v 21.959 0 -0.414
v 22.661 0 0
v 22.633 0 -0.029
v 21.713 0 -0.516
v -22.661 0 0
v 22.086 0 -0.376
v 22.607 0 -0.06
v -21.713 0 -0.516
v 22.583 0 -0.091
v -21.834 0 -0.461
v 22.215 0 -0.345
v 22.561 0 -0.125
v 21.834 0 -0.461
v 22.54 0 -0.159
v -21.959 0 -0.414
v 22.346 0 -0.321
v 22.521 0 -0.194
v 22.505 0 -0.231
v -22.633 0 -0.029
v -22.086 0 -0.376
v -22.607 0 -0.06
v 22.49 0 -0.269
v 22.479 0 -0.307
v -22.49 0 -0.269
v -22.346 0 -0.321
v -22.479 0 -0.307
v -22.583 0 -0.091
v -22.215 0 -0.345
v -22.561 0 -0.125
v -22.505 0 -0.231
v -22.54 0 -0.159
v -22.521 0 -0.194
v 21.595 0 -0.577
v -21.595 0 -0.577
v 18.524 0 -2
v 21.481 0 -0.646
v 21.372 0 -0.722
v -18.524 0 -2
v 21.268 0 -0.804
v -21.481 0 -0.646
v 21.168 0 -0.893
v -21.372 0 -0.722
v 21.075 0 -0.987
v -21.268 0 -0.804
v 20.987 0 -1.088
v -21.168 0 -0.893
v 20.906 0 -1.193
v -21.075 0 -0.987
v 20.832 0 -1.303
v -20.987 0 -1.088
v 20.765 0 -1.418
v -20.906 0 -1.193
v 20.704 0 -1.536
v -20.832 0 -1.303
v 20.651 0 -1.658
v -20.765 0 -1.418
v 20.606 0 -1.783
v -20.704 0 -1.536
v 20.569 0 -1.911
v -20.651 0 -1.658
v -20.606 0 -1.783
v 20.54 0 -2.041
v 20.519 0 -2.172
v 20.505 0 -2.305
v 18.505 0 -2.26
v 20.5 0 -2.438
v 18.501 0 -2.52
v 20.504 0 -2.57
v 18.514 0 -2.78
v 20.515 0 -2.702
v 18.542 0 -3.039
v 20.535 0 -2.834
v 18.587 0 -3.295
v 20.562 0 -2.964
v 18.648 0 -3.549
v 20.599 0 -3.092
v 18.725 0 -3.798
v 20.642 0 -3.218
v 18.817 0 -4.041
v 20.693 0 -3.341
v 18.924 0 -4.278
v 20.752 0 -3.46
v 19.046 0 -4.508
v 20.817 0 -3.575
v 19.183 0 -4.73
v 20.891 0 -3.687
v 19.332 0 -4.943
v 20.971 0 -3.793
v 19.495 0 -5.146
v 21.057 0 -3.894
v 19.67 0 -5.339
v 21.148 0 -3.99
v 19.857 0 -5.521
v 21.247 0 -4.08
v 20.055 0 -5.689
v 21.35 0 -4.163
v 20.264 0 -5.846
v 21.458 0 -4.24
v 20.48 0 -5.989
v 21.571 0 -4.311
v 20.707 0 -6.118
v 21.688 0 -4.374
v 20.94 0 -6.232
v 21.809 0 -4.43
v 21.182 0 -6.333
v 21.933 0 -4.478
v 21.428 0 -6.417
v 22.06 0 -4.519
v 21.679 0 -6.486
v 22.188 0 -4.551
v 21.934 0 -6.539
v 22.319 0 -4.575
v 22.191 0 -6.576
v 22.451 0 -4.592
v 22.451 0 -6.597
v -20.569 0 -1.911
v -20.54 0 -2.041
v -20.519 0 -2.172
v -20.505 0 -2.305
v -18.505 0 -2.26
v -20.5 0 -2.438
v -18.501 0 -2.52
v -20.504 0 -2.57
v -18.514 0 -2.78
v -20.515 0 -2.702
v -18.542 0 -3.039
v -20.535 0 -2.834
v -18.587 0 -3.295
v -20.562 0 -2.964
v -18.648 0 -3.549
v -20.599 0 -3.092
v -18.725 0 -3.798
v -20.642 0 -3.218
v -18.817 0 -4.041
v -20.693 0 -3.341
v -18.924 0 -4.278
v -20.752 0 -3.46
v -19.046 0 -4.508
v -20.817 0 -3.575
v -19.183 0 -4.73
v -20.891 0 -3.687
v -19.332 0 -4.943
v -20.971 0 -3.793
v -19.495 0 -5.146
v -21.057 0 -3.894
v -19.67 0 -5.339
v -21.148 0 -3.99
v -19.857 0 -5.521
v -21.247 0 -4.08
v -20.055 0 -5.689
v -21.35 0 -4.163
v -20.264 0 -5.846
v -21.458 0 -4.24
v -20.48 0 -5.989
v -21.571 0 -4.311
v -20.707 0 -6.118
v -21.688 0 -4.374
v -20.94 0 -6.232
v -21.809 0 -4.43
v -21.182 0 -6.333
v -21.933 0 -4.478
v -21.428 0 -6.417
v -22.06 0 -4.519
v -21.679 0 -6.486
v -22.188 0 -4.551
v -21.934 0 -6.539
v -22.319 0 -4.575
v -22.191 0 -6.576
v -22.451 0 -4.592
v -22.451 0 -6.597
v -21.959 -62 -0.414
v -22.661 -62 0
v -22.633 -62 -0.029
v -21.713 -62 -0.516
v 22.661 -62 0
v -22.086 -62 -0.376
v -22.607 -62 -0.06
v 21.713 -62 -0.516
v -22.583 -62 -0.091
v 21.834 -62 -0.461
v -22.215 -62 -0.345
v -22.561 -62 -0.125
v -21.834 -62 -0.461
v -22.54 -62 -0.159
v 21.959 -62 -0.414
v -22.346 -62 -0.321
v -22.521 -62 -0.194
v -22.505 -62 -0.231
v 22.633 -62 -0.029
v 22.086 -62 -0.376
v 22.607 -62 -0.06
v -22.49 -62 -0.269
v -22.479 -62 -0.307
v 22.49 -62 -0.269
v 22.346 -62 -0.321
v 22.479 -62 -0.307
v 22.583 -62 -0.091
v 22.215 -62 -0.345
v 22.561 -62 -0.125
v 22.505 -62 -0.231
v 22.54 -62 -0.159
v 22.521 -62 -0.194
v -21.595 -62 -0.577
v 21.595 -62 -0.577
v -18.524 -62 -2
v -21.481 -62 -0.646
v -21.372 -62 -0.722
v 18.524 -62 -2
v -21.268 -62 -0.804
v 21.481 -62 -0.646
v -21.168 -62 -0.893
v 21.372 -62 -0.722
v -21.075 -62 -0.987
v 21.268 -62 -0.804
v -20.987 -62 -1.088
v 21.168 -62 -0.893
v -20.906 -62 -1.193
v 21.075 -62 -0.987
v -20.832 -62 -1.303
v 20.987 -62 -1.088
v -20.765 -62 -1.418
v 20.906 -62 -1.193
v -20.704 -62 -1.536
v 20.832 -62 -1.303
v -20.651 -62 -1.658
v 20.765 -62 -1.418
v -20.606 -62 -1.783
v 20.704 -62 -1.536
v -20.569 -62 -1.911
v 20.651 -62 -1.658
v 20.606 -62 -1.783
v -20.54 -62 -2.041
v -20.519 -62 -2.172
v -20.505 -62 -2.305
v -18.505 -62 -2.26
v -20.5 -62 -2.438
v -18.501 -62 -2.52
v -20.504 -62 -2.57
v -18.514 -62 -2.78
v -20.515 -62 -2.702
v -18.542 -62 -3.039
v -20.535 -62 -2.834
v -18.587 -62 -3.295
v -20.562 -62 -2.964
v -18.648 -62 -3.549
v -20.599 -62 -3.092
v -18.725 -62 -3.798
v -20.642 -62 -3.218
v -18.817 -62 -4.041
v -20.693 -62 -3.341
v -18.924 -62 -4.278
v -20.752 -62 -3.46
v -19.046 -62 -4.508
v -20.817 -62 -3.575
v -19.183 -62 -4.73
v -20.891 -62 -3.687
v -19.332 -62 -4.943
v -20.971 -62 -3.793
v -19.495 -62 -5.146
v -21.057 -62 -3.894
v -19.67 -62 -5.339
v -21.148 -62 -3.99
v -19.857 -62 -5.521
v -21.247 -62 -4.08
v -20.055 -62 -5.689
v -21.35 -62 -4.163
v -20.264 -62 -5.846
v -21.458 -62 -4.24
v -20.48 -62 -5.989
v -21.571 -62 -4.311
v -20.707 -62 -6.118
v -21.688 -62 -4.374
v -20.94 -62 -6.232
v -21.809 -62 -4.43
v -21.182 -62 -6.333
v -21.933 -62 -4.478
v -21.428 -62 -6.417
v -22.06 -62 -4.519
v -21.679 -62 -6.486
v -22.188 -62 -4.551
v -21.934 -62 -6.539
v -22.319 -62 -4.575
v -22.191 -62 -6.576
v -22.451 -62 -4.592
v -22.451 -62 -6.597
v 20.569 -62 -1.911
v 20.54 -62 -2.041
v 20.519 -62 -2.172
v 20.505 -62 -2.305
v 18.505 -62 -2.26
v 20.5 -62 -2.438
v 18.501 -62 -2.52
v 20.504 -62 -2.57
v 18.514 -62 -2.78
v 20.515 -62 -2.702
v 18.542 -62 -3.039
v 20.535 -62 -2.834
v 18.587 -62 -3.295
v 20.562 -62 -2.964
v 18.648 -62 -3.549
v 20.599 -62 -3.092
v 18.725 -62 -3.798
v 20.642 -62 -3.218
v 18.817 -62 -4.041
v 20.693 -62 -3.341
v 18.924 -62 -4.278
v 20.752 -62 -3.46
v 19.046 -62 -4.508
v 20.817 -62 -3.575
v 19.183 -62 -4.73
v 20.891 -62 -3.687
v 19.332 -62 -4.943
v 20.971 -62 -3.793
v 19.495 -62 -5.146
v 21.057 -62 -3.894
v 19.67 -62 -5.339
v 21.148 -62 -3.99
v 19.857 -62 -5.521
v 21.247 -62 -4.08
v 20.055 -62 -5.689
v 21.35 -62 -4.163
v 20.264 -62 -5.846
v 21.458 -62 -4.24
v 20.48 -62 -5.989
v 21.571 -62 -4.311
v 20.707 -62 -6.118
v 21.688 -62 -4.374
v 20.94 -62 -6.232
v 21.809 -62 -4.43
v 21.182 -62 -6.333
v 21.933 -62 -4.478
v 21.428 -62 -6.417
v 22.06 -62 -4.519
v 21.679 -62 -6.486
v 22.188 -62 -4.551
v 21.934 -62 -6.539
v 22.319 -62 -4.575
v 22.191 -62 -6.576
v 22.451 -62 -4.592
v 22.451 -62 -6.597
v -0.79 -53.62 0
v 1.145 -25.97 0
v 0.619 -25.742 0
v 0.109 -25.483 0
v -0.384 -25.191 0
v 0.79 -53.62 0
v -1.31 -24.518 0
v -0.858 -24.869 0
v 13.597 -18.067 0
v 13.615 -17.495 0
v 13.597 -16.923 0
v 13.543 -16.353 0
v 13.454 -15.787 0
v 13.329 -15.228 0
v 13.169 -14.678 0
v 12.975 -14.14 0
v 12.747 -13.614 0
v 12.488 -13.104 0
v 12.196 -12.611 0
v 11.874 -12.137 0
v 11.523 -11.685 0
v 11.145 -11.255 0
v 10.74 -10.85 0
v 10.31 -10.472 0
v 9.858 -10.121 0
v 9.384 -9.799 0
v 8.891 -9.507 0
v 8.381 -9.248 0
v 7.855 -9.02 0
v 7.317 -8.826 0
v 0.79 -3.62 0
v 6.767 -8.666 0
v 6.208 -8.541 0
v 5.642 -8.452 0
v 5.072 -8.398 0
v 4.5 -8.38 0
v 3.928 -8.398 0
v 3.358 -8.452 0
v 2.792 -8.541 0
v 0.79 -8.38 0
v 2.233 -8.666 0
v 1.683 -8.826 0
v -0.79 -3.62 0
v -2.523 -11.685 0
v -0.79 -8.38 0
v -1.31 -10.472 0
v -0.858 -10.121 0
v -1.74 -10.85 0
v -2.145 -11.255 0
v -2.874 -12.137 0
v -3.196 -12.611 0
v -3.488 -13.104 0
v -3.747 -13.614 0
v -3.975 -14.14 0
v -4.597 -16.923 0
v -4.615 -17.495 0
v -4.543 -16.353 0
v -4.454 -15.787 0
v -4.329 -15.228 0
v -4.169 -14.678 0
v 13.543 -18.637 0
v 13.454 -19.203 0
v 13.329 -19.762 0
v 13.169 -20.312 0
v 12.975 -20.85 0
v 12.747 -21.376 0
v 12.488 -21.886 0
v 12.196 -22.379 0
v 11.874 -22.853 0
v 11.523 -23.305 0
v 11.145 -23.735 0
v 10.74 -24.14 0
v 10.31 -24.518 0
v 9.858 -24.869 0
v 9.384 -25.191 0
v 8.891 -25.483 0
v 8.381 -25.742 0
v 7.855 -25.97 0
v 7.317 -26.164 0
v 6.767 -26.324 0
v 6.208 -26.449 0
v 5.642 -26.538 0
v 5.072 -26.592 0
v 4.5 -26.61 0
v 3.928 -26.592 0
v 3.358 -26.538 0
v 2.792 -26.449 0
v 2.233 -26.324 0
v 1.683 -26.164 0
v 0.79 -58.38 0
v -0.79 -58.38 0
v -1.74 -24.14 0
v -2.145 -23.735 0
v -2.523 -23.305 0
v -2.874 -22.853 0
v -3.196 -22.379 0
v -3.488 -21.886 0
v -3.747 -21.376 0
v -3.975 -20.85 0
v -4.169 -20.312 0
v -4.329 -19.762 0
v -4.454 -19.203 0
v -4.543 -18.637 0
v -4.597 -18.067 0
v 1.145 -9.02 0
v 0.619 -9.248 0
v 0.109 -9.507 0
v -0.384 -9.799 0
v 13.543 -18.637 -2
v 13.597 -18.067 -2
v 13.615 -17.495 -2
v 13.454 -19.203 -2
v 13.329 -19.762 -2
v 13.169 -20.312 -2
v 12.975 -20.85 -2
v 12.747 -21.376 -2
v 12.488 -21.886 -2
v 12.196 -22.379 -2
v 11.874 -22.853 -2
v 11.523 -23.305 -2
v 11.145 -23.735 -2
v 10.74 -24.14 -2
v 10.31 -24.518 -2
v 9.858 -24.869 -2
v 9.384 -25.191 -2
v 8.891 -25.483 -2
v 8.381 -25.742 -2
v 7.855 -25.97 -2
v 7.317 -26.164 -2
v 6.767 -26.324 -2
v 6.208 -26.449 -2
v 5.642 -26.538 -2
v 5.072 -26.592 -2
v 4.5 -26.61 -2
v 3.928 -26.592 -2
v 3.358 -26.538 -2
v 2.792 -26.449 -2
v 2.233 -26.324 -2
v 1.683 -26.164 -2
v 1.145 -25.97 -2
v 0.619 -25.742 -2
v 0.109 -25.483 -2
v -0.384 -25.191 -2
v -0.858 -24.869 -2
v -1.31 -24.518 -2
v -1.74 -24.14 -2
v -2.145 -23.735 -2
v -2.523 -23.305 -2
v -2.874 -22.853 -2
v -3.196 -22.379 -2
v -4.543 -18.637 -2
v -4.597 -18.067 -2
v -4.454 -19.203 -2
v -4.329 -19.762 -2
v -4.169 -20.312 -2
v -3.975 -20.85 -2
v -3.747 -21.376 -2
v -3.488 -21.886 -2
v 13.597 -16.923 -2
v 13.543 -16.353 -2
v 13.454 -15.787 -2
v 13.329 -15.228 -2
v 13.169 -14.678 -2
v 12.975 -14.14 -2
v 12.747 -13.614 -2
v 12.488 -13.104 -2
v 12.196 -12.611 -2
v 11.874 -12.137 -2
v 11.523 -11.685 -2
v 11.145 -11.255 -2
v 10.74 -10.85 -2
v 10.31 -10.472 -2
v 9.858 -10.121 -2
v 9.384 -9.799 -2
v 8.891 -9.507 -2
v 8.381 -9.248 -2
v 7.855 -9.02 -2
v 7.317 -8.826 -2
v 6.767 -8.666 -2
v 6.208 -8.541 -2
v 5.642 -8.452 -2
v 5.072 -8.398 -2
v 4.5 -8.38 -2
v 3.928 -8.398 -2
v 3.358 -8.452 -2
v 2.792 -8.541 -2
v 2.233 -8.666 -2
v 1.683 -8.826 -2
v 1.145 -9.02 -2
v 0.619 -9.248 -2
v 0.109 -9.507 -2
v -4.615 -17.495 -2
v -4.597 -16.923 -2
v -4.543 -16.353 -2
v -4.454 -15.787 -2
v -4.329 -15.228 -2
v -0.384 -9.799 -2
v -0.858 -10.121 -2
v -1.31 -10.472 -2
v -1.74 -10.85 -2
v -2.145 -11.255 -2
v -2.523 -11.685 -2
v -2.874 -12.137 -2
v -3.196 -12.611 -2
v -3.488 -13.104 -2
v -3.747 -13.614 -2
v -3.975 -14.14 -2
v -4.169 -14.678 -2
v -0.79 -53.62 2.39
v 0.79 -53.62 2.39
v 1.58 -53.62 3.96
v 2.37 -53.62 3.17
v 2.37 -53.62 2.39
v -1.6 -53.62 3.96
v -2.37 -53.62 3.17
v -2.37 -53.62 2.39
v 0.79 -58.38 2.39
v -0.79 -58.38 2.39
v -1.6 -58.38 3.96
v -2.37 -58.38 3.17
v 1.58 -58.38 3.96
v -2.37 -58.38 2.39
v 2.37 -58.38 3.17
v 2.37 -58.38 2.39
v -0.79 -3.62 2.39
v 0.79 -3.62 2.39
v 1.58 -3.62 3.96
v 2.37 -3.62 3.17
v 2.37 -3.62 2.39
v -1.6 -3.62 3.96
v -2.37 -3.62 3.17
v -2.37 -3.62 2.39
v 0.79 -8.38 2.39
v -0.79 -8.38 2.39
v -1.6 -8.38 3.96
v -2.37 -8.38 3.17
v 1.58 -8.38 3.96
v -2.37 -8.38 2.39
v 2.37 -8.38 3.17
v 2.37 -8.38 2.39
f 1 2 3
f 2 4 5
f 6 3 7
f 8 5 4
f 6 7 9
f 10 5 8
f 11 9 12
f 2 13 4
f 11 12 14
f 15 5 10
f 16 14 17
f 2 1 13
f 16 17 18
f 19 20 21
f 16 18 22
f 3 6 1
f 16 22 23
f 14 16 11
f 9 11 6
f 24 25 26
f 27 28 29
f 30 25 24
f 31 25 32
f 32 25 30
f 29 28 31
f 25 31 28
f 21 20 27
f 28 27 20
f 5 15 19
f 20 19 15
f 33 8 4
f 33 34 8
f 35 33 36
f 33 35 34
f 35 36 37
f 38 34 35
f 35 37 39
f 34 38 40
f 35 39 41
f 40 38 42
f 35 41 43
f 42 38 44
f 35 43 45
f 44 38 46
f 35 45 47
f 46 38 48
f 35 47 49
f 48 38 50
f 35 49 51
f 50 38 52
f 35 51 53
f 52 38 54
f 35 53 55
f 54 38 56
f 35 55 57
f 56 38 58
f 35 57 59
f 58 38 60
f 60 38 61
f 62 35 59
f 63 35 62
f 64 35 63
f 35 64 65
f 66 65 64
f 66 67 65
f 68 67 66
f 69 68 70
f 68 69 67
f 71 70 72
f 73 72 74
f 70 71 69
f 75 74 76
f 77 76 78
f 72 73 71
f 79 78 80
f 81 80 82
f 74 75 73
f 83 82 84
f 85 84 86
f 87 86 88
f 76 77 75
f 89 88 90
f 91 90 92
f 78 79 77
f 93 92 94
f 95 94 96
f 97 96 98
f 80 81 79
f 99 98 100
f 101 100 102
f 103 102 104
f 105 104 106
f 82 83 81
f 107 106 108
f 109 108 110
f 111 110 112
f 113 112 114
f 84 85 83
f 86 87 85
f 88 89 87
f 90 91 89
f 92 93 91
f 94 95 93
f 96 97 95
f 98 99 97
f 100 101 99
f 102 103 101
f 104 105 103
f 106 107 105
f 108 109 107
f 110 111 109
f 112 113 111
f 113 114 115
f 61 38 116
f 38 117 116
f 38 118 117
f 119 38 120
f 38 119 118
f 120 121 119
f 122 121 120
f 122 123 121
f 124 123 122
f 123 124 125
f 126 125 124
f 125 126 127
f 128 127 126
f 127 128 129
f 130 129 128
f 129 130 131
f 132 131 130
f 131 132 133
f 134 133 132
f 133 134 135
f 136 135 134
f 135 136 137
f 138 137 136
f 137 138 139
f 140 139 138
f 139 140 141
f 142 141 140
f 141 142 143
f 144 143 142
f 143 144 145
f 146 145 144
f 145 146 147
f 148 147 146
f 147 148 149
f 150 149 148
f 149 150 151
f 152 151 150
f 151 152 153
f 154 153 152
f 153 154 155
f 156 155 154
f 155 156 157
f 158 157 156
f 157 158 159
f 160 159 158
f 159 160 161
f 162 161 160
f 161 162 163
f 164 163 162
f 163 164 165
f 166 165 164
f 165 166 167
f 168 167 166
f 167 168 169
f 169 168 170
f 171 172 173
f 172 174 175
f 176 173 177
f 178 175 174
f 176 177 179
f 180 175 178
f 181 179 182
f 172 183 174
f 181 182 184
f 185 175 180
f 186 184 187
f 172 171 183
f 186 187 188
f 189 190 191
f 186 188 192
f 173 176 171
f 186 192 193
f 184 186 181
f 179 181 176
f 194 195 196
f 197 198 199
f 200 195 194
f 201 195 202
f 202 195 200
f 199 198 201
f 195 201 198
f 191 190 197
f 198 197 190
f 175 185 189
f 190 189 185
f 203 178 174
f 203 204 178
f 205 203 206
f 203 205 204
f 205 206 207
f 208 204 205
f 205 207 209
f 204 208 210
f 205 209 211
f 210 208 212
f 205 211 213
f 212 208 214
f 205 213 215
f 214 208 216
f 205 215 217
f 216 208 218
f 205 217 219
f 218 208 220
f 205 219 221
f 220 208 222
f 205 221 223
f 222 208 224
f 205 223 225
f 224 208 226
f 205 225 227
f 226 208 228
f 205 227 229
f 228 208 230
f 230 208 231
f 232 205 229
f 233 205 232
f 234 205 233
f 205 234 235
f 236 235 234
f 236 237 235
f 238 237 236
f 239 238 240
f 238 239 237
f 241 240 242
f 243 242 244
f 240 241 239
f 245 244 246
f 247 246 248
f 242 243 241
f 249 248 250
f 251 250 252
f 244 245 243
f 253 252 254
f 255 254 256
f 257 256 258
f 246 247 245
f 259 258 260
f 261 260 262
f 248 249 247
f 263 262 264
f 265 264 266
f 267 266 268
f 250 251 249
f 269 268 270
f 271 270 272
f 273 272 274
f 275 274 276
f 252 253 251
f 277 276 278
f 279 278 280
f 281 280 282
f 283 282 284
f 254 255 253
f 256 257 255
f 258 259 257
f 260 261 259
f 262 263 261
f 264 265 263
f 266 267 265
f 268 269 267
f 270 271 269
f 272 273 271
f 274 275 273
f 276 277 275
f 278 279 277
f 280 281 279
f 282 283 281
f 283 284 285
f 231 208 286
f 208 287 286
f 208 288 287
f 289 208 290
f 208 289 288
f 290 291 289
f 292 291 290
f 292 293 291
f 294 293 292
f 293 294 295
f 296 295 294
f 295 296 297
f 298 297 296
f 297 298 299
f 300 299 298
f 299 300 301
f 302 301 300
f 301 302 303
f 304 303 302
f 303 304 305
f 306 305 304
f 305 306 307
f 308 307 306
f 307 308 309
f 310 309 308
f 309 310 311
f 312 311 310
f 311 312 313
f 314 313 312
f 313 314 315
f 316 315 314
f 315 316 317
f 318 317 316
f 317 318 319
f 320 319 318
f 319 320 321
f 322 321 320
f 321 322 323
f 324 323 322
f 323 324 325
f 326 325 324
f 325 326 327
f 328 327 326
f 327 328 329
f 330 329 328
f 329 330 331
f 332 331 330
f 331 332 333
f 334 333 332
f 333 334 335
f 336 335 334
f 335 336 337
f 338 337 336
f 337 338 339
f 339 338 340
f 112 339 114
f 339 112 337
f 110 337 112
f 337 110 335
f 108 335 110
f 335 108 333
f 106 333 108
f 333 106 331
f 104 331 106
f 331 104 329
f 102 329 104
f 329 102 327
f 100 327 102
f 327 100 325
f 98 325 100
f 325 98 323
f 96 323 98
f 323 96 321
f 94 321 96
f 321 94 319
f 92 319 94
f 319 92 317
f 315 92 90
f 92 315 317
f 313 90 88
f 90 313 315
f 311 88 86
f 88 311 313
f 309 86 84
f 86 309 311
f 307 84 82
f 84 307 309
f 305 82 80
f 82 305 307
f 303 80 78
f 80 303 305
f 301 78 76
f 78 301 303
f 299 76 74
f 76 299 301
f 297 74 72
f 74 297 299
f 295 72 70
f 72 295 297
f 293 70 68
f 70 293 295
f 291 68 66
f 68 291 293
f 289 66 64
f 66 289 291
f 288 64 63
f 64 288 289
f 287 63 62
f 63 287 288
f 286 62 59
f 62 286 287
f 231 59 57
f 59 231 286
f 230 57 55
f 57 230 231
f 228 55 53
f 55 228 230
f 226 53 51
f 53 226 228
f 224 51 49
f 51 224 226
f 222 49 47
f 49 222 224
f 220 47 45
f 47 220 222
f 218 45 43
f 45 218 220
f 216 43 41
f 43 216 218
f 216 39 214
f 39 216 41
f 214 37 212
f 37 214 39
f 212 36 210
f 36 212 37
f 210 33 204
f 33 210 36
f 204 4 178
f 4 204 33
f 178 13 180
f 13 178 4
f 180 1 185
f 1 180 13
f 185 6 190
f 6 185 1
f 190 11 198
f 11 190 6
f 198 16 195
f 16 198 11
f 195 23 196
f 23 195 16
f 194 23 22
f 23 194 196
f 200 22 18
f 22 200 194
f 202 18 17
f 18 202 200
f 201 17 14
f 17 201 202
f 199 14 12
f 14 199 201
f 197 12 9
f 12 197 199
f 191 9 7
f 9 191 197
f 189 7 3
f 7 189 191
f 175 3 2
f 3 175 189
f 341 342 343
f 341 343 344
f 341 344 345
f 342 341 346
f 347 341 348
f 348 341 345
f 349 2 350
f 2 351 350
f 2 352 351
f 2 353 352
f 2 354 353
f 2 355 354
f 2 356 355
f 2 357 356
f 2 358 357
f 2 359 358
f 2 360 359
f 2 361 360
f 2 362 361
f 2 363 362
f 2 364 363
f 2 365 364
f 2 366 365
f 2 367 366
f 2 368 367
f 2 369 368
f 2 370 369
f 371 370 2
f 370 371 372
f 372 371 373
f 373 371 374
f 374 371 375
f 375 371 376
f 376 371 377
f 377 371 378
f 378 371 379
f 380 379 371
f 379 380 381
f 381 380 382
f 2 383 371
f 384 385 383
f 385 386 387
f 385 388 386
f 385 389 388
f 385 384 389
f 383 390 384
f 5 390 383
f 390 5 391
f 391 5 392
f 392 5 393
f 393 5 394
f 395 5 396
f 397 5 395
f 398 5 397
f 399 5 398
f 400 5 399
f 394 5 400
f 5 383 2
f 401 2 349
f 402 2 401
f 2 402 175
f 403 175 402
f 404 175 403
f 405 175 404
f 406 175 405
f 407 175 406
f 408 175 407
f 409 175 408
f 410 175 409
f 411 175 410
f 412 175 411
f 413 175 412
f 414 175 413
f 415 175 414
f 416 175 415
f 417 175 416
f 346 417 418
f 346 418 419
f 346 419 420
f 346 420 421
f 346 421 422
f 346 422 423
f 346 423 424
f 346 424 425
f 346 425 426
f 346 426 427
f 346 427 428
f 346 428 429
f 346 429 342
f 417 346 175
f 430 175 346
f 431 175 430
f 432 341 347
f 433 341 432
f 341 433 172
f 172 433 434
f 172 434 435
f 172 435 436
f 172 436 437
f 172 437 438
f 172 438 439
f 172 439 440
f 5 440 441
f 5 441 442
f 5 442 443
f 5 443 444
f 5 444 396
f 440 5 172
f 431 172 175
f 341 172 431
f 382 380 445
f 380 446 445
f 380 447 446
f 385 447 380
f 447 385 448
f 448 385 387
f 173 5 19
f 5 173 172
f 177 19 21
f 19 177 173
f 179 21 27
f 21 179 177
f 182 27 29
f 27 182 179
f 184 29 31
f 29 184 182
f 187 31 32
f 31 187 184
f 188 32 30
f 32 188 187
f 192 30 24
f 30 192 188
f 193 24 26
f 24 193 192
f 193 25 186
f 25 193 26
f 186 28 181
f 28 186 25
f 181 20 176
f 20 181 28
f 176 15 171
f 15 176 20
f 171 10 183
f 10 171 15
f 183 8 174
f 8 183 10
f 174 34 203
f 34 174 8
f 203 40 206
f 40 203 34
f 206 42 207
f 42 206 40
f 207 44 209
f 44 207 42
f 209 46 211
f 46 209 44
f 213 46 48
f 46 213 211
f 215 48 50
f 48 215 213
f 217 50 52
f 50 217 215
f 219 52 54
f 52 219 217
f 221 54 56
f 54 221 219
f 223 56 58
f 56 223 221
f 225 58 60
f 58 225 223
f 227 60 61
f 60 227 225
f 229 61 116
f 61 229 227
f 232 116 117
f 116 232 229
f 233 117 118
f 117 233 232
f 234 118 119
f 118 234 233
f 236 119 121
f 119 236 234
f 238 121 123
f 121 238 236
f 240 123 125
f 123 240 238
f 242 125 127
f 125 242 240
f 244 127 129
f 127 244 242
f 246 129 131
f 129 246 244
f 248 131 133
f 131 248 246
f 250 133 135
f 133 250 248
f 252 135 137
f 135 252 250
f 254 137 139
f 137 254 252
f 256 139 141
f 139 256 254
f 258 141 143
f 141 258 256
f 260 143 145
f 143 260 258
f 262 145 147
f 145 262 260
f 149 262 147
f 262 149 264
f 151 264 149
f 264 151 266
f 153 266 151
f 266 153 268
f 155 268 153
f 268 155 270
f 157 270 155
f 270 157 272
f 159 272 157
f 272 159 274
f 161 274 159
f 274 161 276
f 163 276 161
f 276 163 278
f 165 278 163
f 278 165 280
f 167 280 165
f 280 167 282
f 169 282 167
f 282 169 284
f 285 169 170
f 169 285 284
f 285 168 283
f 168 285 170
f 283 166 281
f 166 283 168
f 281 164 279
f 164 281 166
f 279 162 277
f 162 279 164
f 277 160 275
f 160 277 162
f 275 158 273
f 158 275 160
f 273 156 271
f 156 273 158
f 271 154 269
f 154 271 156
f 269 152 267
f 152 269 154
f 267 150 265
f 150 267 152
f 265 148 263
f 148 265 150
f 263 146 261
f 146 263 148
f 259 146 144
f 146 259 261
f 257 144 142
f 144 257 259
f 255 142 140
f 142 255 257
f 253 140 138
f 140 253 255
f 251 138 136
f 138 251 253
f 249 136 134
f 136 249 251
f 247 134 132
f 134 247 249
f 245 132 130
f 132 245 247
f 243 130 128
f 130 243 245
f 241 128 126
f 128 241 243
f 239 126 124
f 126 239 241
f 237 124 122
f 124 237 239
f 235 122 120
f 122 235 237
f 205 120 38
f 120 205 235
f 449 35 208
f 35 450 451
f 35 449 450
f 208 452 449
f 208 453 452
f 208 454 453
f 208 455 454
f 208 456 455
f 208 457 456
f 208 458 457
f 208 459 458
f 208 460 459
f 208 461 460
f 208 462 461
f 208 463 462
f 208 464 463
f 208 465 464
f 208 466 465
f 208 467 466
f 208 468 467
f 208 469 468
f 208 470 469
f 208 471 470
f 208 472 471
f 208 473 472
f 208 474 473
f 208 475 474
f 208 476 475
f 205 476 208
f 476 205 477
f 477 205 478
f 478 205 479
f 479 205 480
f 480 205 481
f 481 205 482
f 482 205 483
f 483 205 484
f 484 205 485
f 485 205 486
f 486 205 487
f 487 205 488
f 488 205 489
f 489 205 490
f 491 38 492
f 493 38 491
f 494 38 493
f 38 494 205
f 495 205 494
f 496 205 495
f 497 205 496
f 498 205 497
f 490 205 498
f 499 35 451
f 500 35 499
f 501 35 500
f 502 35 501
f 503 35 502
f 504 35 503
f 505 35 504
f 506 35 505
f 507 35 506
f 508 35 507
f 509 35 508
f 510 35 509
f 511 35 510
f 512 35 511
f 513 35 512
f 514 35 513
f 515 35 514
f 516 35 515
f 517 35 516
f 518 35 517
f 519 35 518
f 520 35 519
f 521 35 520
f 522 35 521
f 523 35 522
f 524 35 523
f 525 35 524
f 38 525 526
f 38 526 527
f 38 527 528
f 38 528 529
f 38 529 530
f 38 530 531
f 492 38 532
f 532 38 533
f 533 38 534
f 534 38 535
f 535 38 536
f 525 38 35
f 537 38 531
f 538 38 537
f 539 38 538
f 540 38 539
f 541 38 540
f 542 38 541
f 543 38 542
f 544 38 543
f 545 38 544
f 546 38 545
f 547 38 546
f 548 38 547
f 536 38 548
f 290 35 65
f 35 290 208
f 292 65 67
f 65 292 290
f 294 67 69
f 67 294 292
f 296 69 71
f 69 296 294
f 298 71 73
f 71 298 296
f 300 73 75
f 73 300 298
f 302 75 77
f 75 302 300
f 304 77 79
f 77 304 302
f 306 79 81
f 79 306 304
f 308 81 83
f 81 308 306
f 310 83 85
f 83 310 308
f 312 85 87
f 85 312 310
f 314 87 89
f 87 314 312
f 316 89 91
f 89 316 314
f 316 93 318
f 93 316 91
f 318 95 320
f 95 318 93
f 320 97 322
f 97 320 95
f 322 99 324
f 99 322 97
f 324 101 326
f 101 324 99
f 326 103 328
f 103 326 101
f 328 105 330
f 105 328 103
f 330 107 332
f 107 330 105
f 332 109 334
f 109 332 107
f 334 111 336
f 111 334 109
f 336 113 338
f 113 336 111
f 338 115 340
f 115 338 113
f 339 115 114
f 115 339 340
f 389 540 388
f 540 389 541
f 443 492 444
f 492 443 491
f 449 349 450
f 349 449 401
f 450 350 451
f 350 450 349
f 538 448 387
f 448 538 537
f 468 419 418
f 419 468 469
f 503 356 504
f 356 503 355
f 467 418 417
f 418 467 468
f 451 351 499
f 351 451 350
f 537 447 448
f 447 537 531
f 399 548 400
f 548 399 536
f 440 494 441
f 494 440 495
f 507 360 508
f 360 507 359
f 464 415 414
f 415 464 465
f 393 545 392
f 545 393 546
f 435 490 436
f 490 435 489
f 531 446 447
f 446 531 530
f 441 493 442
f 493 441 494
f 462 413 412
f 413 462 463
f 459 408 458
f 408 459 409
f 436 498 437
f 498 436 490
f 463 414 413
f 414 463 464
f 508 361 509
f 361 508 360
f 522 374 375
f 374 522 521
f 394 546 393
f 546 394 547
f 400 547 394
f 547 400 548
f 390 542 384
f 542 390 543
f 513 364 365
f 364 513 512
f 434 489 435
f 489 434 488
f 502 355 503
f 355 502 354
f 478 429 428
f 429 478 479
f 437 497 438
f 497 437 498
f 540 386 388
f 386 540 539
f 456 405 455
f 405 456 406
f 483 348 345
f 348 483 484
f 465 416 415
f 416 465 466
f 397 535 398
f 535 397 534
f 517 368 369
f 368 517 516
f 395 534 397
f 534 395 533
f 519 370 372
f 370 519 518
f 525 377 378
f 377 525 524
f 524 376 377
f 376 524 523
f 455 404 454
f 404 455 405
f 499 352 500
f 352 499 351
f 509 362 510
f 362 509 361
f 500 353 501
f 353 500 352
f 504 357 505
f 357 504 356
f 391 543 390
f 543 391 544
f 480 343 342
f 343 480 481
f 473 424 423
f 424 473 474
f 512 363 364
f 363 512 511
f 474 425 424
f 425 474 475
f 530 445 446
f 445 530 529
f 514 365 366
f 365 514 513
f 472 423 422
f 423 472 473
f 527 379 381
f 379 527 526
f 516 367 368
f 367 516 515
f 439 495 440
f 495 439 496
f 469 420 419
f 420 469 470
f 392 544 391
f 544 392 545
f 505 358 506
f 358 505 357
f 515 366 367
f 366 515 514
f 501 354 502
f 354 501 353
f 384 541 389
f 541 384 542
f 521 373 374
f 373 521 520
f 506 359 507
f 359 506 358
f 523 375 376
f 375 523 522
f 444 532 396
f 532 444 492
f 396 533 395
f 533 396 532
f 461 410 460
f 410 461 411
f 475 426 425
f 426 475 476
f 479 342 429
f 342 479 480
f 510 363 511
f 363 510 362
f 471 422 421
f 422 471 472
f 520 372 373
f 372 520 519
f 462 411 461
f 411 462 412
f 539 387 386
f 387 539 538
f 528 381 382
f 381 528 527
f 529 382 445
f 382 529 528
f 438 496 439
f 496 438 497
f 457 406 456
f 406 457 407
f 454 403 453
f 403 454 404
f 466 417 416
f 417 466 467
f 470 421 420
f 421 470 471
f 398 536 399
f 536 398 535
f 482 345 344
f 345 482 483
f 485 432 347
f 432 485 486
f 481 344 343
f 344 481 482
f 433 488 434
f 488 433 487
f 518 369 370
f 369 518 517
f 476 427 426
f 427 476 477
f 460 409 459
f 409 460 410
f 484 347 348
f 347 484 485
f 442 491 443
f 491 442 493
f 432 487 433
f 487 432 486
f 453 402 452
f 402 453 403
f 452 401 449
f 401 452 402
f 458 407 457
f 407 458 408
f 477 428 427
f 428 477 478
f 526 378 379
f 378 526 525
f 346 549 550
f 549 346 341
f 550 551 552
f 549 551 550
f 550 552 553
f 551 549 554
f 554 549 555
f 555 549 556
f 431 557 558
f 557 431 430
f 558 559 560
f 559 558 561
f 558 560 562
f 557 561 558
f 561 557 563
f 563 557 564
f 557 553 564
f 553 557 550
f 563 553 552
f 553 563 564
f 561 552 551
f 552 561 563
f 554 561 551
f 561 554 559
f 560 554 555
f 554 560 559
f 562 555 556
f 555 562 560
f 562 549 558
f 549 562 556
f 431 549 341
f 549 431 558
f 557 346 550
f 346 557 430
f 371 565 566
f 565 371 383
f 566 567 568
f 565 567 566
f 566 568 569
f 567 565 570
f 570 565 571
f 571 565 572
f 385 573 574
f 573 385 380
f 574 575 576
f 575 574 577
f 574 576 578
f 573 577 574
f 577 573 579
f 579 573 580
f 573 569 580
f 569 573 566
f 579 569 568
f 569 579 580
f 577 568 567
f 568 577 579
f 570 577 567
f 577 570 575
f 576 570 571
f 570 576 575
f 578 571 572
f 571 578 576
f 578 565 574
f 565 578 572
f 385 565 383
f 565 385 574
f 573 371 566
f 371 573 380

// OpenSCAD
// file: Box.scad
/* Box.scad
 * 2018 05 12
 * gratefulfrog.org
 * generates a box for a video camera that mounts to the Freewing Stores pod
 * Usage:
 * at the very end of the file, uncomment the line:
 * //boxWithGridAndHooks("d");
 * then hit F5 to get a view, or F6 to build the object.
 * It will take quite some time, during which OpenSCAD will bu unresponsive, that is normal
 * so just be patient.
 * ATENTION: this file is included in 2PartBox.scad so be sure to leave the last line
 * commented out if you intend to use 2PartBox.scad
 */



/* unused exact camera dimensions, excluding the lens
width : 35mm
length: 60mm
height: 18mm
*/

$fn=100;

wallThickness = 2;
innerX=37;
innerY=62;
innerZ=20;
outerX=innerX+2*wallThickness;
outerY=innerY+2*wallThickness;
outerZ=innerZ+2*wallThickness;

innerExtensionY = 20; // to cut off the end of the outer box

// hok measurements
hookSpacingY  = 50;
hookLength    = 4.76;
BottomWidth      = 1.58 ;
FirstVertical    = 2.39;
bottomWingWidth  = 1.58;
_2ndVertical     = 0.78;
_3rdVertical     = _2ndVertical+0.01;
TopWidth         = 3.18;

hookSupportX = BottomWidth  + 2*bottomWingWidth;
hookSupportY = hookSpacingY + hookLength;
hookSupportZ = wallThickness;

sphereD=wallThickness*2;

heatSinkRFactor =  0.75;
//heatPortD= innerX*heatSinkRFactor;

heatPortD= innerX*heatSinkRFactor - 2*hookLength;

module measuredHook(){
  epsilon= wallThickness;  // to ensure ancoring in the base!
  points = [[0,-epsilon],
            [BottomWidth,-epsilon],
            [BottomWidth,FirstVertical],
            [BottomWidth+bottomWingWidth,FirstVertical],
            [BottomWidth+bottomWingWidth,FirstVertical+_2ndVertical],
            [BottomWidth+bottomWingWidth-_3rdVertical,FirstVertical+_2ndVertical+_3rdVertical],
            [BottomWidth+bottomWingWidth-_3rdVertical-TopWidth,FirstVertical+_2ndVertical+_3rdVertical],
            [-BottomWidth,FirstVertical+_2ndVertical],
            [-BottomWidth,FirstVertical],
            [0,FirstVertical]];
  translate([-BottomWidth/2.0,hookLength,0])
  rotate([90,0,0])
    linear_extrude(height = hookLength)
      polygon(points,convexity = 1);
}
module twoMeasuredHooks(withSupport=true){
  measuredHook();
  translate([0,hookSpacingY,0])
    measuredHook();
  if (withSupport){
    translate([-hookSupportX/2.,0,-hookSupportZ])
      cube([hookSupportX,hookSupportY,hookSupportZ]);
  }
}
module sp2(){
  translate([sphereD/2.,0,sphereD/2.]){
    sphere(d=sphereD);
    translate([outerX-sphereD,0,0])
      sphere(d=sphereD);
  }
}
module sp4(){
  sp2();
  translate([0,outerY,0])
    sp2();
}
module roundedBox(){
  boxTranslateY = -(outerY-(hookSpacingY+hookLength))/2.;
  translate([-outerX/2.,boxTranslateY,-outerZ]){
    difference(){
      hull(){
        sp4();
        translate([0,0,outerZ-sphereD])
          sp4();
      }
      translate([wallThickness,wallThickness-innerExtensionY,wallThickness])
        cube([innerX,innerY+innerExtensionY,innerZ]);
    }
  }
}
module grid(gWidth=heatPortD+5,lineSpacing=2,lineWidth=0.5){
  translate([-gWidth/2.,0,0])
  for (i=[0:lineSpacing+lineWidth:gWidth]){
    translate([i,0,0]){
     square([lineWidth,gWidth],center=true);
    }
  }
}
module crissCross(){
  rotate([0,0,90])
        grid();
  grid();
}
module gridCutter(h){
  linear_extrude(height=h)
    difference(){
      circle(d=heatPortD);
      crissCross();
    }
  }
module circCutter(h){
  littleD=4;
  linear_extrude(height=h)
    intersection(){   
      circle(d=heatPortD);
      translate([-heatPortD/2.,-heatPortD/2.,0])
        for (i=[0:littleD+1:heatPortD+littleD+1])
          translate([0,i,0])
            for (j=[0:littleD+1:heatPortD+littleD+1])
              translate([j,0,0])
                circle(d=littleD);
    }    
}
module discCutter(h){
  linear_extrude(height=h)
      circle(d=heatPortD);
}
module boxWithGridAndHooks(circs){
  extrudeH = 5;
  difference(){  
    roundedBox();
    translate([4.5,40,-extrudeH/2.])
      if (circs== "d")
        #discCutter(extrudeH);
      else if (circs== "c")
        #circCutter(extrudeH);
      else
        #gridCutter(extrudeH);
  }
  #twoMeasuredHooks(false );
}
// uncomment boxWithGridAndHooks("d");  to generate a one piece box with hooks as per
// arguments: 
// "c" -> get circular grid cut
// "d" -> get a big disc cut
// anything else -> get a rectangular grid cut
//boxWithGridAndHooks("d");
// main file
/* 2PartBox.scad
 * 2018 05 12
 * gratefulfrog.org
 * generates a box for a video camera that mounts to the Freewing Stores pod
 * This version creates a 2 part box that slides together.
 * Usage:
 * at the very end of the file, this line generates the box parts
 *    doBox("x");
 * the arguments are explained just above that line. 
 * hit F5 to get a view, or F6 to build the object.
 * ATENTION: this file includes the file Box.scad, so if you get unepexected results, like long
 * delays in building, then check that there are no top level build commands uncommented in
 * Box.scad.
 */

/* unused exact camera dimensions, excluding the lens
width : 35mm
length: 60mm
height: 18mm
*/

include <Box.scad>

$fn = 100;

wallThickness = 2;
innerX=37;
innerY=62;
innerZ=20;
outerX=innerX+2*wallThickness;
outerY=innerY+2*wallThickness;
outerZ=innerZ+2*wallThickness;

sliderZ = innerY+wallThickness;
topZ    = innerY;

hooksOffsetZ = (topZ-hookSpacingY-hookLength)/2.;

module bottom(){
  color("LightCoral",1){
    hull()
      intersection(){
        translate([0,0,-wallThickness])
          linear_extrude(height=sliderZ,convexity=10)
            import("Box Grooved 01 inverted.dxf",layer="0");
        translate([-50,-50,-10])
          cube([100,100,10]);
      }
    
    translate([0,0,-wallThickness])
      linear_extrude(height=sliderZ,convexity=10)
        import("Box Grooved 01 inverted.dxf",layer="0");
    }
  }
module top(){
  color("aqua",1.0){
    difference(){
      linear_extrude(height=topZ,convexity=5)
        import("Box Grooved 01 inverted.dxf",layer="base",convexity=10);
      discC();
    }
    translate([0,0,hooksOffsetZ])
      rotate([-90,0,0])
        translate([0,-hookSupportY,0])
          twoMeasuredHooks(false);
  }
}
module discC(h=wallThickness*4.){
  discOffsetX = (innerX/2.-(1.5+4*wallThickness))/2.;
  translate([discOffsetX,h/2.,hookLength+hooksOffsetZ+heatPortD/2.])
    rotate([90,0,0])
      linear_extrude(height=h)
        circle(d=heatPortD);
}
module doBox(part="x"){
  rotate([90,0,0]){
    if (part != "t") bottom();
    if (part != "b") top();
    }
  }
/* The following line will generate the 2 part box parts depending on 
 * the arguments:
 * "t" : generate only the tope
 * "b" : generate only the bottom
 * anything else : generate both top and bottom
 */
doBox("t");
echo(heatPortD);
